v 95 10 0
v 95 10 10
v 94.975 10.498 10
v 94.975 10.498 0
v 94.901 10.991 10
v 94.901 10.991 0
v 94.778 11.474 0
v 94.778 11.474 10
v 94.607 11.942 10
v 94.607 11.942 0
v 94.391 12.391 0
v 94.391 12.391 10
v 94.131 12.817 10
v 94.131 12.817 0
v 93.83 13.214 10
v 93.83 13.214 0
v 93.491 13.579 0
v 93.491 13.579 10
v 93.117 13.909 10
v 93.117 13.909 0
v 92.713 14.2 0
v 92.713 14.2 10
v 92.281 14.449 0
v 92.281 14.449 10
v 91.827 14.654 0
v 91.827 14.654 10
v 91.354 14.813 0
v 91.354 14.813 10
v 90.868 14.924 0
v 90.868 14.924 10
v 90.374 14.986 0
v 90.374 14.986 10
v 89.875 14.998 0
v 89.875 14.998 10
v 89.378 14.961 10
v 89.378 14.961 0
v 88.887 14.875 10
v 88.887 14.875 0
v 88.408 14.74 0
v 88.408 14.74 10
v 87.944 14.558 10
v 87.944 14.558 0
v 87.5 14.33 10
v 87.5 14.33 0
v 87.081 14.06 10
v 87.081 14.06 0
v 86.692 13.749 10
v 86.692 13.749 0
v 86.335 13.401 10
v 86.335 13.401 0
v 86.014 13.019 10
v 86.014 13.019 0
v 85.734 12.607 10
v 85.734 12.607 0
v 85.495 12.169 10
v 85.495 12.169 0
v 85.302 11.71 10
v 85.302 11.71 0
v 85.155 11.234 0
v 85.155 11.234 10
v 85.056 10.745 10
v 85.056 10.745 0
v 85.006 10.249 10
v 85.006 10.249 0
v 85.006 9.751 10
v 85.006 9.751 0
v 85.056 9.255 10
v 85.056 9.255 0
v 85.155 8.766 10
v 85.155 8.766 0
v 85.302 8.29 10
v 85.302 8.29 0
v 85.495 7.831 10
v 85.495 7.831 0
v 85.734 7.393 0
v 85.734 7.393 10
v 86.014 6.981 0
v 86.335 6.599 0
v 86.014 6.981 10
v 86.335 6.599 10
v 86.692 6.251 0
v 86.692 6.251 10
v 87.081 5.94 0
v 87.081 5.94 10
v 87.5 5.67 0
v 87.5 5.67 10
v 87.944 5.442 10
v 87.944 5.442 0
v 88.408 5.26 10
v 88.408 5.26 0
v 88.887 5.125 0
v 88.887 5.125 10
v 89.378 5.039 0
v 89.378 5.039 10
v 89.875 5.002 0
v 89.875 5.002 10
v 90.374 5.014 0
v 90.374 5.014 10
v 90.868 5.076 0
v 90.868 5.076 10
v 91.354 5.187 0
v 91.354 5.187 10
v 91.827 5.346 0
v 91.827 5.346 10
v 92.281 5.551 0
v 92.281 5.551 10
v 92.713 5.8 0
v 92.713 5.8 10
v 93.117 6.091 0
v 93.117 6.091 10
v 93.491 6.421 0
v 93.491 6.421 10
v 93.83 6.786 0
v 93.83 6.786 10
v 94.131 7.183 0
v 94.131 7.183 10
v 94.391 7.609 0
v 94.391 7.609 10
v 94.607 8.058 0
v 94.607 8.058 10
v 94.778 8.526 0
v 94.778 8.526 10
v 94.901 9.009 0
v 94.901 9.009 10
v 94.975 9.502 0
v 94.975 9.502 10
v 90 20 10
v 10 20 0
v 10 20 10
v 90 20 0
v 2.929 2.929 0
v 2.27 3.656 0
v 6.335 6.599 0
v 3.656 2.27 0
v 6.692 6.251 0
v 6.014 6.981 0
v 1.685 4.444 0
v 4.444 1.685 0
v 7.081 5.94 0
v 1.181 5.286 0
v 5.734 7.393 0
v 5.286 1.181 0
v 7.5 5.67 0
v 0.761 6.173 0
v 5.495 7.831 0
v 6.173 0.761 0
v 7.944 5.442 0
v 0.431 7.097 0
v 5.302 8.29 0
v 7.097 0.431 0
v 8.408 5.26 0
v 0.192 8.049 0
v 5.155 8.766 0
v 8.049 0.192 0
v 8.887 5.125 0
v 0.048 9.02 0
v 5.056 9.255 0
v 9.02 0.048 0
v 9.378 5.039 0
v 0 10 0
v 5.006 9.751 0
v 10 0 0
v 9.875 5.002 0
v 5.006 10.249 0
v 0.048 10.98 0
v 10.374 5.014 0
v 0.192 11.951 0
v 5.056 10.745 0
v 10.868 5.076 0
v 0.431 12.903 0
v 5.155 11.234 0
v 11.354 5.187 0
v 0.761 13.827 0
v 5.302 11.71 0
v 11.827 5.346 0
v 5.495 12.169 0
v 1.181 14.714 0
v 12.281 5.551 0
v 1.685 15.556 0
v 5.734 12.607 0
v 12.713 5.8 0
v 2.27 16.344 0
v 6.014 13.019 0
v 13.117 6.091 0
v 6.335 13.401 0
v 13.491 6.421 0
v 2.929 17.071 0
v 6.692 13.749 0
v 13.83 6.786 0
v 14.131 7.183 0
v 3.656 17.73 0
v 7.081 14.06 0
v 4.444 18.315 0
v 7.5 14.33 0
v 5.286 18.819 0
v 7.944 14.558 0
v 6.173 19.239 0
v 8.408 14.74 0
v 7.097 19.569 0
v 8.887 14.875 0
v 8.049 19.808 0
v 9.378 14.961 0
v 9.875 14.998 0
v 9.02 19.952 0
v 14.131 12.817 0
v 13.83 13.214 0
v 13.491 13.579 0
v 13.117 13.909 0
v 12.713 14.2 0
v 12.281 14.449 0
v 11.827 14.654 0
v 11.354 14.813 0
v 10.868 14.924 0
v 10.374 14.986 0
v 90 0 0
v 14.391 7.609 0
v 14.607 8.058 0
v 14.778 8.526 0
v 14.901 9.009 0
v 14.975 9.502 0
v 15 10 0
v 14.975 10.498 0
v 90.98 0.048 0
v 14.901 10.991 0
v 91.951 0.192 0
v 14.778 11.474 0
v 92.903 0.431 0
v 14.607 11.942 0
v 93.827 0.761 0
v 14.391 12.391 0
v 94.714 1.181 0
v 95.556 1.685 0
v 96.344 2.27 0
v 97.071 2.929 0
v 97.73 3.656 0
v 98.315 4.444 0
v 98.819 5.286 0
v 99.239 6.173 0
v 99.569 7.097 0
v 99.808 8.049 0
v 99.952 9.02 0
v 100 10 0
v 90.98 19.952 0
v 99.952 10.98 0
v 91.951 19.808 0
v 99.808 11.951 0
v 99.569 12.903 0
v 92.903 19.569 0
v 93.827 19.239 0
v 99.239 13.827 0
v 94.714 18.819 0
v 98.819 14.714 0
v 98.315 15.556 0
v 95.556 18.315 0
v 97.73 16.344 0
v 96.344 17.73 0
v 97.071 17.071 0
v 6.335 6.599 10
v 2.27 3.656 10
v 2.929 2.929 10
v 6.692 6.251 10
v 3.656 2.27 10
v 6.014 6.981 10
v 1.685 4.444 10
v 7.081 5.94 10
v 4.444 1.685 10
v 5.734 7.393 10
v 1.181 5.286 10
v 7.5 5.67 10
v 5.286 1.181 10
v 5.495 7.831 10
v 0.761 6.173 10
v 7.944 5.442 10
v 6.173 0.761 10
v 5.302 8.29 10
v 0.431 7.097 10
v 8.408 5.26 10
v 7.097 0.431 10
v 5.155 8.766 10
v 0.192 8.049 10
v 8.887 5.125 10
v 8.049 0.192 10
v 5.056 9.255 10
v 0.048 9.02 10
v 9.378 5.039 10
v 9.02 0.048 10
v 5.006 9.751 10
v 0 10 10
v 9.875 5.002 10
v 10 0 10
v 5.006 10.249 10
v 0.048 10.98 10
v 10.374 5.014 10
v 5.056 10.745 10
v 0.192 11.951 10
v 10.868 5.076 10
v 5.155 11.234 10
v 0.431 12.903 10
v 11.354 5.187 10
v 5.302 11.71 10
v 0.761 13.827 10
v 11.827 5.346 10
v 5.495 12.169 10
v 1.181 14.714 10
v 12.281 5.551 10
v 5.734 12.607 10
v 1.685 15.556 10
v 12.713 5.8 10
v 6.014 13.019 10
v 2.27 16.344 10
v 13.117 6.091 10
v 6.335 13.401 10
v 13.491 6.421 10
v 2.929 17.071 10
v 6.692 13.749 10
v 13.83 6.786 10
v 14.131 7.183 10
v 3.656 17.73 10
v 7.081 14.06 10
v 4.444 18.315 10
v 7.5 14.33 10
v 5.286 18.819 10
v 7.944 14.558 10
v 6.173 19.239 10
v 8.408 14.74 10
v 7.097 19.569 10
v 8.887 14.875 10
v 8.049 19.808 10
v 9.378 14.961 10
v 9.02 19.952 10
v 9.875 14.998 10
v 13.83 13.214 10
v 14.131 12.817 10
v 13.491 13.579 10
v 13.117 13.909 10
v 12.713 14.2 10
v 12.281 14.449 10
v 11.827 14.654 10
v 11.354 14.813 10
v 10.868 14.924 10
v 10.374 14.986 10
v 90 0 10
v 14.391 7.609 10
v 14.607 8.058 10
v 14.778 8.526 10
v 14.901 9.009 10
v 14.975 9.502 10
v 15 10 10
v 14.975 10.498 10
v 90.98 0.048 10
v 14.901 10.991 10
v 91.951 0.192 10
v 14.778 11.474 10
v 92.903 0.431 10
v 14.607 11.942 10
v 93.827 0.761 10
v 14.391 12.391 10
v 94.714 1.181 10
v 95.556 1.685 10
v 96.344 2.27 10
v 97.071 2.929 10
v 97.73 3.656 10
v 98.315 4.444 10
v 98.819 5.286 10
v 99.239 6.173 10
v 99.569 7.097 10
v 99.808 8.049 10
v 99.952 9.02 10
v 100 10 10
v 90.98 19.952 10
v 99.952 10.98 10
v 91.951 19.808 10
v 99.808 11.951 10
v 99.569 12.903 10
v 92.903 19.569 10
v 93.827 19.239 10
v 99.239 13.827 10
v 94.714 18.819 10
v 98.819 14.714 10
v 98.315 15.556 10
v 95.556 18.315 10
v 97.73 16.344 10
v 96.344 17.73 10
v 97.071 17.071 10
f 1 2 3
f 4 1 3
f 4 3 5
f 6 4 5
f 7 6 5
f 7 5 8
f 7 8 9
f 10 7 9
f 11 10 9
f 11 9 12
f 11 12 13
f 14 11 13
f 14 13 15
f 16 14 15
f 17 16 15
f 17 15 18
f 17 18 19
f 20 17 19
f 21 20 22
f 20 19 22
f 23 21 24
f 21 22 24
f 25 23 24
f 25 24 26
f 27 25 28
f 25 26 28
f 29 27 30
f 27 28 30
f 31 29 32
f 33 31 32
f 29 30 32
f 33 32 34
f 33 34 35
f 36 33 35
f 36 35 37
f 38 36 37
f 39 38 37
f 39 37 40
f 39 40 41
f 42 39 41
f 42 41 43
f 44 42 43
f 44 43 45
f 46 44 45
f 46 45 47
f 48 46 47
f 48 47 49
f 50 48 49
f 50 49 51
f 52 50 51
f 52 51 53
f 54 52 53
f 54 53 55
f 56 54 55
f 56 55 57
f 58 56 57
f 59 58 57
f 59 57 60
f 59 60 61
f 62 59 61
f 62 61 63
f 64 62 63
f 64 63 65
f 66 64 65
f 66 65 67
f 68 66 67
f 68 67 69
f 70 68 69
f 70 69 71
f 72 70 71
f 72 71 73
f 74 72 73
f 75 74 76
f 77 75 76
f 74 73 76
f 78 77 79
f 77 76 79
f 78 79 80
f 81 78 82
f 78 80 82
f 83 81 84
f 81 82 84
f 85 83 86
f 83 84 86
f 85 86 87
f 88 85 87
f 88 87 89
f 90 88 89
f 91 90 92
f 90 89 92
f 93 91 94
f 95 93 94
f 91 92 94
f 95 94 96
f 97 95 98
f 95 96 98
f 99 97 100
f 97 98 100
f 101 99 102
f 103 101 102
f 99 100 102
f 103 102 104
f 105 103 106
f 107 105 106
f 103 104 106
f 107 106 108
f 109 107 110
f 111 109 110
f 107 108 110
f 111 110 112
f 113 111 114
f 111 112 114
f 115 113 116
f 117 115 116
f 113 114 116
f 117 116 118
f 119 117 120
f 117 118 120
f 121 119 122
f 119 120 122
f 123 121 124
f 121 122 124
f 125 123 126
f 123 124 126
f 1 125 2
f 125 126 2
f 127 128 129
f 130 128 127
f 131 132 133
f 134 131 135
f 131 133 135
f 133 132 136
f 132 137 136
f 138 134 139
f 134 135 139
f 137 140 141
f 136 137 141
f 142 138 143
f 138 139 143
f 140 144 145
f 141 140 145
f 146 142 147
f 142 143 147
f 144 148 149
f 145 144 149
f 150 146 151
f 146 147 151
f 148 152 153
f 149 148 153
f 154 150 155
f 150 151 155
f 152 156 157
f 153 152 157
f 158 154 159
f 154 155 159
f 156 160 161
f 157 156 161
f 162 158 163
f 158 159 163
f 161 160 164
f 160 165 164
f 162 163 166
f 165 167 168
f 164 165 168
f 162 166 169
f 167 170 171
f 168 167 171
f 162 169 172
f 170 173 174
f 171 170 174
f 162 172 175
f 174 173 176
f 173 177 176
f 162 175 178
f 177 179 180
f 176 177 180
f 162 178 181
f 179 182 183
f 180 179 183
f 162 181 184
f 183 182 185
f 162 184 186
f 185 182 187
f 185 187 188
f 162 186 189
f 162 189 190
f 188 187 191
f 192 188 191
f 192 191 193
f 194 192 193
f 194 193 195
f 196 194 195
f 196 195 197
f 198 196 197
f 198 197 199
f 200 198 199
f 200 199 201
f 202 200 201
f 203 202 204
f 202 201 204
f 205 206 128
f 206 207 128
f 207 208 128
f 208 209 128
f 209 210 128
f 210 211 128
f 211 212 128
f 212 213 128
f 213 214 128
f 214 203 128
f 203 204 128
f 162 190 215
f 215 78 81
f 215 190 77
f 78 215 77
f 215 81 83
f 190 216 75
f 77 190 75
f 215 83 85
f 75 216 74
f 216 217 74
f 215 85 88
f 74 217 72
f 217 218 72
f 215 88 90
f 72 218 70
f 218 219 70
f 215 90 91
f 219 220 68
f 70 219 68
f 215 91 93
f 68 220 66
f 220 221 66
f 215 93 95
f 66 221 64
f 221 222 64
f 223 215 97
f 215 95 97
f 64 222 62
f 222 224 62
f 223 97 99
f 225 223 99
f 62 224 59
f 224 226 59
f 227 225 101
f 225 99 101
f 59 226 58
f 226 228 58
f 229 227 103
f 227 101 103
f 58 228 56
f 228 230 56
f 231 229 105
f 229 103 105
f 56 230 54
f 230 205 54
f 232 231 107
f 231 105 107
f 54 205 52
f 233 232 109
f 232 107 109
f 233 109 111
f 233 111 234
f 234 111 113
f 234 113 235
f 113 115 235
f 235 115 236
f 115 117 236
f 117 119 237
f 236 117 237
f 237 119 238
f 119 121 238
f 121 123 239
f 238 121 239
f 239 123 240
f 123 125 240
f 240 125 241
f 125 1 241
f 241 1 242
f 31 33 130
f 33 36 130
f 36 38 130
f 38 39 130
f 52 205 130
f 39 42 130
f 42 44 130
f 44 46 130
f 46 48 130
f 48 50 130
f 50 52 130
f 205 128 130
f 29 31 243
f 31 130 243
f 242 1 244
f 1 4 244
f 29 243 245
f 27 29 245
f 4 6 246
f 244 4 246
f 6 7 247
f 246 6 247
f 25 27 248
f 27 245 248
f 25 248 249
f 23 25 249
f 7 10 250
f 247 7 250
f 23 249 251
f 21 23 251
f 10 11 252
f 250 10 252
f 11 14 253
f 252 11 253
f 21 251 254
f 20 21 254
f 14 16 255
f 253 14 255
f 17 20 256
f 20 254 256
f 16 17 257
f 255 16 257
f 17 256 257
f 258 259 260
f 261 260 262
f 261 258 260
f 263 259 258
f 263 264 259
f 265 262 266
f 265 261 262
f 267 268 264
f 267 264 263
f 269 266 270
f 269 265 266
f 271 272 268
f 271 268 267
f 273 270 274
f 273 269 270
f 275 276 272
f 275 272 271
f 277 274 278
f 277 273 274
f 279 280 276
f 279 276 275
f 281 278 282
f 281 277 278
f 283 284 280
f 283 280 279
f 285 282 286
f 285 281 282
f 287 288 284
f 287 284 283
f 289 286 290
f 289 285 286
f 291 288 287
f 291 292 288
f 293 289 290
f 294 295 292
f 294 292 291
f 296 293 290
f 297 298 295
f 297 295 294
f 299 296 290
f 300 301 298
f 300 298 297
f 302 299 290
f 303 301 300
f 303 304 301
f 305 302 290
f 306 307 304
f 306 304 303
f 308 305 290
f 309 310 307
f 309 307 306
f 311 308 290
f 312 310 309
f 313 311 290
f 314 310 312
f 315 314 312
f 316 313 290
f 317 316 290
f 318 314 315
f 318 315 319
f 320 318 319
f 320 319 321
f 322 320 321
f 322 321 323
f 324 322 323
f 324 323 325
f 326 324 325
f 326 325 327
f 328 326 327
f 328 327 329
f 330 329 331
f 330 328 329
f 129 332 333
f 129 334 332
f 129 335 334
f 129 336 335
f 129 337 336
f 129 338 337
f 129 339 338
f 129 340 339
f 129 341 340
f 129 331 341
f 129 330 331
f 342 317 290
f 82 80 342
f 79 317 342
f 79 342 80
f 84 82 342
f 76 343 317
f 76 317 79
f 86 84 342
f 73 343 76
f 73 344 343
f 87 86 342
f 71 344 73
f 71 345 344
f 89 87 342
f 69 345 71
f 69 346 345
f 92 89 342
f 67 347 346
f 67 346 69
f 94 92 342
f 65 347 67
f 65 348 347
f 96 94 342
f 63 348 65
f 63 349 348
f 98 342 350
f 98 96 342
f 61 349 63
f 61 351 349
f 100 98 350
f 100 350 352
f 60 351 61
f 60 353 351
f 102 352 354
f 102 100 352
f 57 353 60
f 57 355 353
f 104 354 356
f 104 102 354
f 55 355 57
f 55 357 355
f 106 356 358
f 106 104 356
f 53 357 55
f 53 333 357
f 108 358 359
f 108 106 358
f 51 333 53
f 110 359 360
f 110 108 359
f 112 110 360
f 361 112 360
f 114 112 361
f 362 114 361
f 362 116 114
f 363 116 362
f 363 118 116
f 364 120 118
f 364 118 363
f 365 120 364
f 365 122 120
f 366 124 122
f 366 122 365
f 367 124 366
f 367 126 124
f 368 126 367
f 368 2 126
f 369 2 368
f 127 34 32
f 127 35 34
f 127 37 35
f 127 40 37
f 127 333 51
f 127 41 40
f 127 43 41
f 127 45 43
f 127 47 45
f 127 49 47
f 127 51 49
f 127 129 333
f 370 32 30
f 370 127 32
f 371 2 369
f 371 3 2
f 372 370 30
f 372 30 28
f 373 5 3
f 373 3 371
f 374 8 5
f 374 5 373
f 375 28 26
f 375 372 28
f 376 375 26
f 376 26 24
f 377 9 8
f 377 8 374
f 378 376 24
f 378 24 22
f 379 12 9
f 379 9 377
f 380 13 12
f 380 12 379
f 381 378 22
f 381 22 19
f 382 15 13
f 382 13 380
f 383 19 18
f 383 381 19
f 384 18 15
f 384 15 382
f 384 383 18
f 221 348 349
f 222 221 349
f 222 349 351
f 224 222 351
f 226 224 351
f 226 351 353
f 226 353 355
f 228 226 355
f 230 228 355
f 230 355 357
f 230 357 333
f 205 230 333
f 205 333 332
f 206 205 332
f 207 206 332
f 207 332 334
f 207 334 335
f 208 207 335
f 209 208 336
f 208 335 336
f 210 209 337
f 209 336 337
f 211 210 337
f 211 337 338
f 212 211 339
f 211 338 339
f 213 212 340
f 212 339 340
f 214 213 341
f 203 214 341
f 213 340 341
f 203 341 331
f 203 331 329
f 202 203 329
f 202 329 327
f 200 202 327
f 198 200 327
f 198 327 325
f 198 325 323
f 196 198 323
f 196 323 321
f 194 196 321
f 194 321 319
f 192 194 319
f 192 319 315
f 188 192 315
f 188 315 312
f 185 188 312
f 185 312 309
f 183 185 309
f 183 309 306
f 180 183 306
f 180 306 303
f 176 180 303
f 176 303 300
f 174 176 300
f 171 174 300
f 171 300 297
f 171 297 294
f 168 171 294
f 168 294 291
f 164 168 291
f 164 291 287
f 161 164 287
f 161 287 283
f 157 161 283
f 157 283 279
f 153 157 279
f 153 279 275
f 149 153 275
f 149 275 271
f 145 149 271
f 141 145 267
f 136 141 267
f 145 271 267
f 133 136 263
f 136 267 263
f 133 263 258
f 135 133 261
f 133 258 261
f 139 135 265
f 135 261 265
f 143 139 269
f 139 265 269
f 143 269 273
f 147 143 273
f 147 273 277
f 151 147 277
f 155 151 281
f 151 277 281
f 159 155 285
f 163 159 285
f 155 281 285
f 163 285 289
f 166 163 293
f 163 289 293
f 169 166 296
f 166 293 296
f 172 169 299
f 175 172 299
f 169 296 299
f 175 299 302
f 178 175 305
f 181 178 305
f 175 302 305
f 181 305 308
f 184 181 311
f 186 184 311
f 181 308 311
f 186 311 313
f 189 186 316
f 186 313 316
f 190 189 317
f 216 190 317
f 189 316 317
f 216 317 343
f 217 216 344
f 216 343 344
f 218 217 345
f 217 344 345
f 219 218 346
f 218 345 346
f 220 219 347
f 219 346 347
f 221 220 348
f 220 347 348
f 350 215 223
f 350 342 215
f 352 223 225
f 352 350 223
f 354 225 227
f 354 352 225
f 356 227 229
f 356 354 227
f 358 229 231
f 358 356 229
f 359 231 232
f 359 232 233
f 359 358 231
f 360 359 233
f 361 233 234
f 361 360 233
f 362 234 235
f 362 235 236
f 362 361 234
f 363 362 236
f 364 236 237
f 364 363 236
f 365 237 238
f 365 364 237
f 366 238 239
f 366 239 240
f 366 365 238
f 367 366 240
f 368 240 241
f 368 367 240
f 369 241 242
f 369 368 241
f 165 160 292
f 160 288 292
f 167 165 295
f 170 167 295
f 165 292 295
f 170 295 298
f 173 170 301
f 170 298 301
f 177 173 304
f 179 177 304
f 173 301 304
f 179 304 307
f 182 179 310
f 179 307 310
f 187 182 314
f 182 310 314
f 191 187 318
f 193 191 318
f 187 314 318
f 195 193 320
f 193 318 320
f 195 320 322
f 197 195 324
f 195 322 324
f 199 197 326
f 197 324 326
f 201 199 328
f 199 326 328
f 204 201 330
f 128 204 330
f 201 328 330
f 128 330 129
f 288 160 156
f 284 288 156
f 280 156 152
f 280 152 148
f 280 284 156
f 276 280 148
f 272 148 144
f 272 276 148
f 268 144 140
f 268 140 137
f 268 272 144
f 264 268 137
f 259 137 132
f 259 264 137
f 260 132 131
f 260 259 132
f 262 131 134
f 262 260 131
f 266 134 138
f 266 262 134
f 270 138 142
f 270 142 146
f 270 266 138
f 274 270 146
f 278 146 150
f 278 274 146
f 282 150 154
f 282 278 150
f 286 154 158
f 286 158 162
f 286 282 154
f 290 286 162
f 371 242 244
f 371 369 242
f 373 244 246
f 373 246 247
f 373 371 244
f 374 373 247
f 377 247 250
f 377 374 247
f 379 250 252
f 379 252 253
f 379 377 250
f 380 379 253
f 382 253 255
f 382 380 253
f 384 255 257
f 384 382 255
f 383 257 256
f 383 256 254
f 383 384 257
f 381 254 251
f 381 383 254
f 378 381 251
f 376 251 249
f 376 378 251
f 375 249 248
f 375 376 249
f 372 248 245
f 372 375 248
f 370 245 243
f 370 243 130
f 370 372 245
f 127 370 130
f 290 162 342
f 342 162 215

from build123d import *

# Parameters (mm, degrees)
SKETCH1_W           = 100
SKETCH1_H           = 20
BOSS_EXTRUDE1_DEPTH = 10
FILLET1_R           = 10
SKETCH5_R           = 5
CUT_EXTRUDE1_DEPTH  = 103.46950766


with BuildPart() as part:
    # Sketch1 → Boss-Extrude1 (new body)
    with BuildSketch(Plane.XY):
        with Locations((50, 10)):
            Rectangle(SKETCH1_W, SKETCH1_H)
    extrude(amount=BOSS_EXTRUDE1_DEPTH)

    # Fillet1
    fillet1_edges = [part.edges().sort_by_distance(p)[0] for p in [
        (100, 20, 5),
        (100, 0, 5),
        (0, 0, 5),
        (0, 20, 5),
    ]]
    fillet(fillet1_edges, radius=FILLET1_R - 0.0001)  # a hair under: the kernel refuses the full size

    # Sketch5 → Cut-Extrude1 (cut, through all)
    with BuildSketch(Plane.XY.offset(10)):
        with Locations((10, 10)):
            Circle(SKETCH5_R)
        with Locations((90, 10)):
            Circle(SKETCH5_R)
    extrude(amount=-CUT_EXTRUDE1_DEPTH, mode=Mode.SUBTRACT)


solid = part.part
